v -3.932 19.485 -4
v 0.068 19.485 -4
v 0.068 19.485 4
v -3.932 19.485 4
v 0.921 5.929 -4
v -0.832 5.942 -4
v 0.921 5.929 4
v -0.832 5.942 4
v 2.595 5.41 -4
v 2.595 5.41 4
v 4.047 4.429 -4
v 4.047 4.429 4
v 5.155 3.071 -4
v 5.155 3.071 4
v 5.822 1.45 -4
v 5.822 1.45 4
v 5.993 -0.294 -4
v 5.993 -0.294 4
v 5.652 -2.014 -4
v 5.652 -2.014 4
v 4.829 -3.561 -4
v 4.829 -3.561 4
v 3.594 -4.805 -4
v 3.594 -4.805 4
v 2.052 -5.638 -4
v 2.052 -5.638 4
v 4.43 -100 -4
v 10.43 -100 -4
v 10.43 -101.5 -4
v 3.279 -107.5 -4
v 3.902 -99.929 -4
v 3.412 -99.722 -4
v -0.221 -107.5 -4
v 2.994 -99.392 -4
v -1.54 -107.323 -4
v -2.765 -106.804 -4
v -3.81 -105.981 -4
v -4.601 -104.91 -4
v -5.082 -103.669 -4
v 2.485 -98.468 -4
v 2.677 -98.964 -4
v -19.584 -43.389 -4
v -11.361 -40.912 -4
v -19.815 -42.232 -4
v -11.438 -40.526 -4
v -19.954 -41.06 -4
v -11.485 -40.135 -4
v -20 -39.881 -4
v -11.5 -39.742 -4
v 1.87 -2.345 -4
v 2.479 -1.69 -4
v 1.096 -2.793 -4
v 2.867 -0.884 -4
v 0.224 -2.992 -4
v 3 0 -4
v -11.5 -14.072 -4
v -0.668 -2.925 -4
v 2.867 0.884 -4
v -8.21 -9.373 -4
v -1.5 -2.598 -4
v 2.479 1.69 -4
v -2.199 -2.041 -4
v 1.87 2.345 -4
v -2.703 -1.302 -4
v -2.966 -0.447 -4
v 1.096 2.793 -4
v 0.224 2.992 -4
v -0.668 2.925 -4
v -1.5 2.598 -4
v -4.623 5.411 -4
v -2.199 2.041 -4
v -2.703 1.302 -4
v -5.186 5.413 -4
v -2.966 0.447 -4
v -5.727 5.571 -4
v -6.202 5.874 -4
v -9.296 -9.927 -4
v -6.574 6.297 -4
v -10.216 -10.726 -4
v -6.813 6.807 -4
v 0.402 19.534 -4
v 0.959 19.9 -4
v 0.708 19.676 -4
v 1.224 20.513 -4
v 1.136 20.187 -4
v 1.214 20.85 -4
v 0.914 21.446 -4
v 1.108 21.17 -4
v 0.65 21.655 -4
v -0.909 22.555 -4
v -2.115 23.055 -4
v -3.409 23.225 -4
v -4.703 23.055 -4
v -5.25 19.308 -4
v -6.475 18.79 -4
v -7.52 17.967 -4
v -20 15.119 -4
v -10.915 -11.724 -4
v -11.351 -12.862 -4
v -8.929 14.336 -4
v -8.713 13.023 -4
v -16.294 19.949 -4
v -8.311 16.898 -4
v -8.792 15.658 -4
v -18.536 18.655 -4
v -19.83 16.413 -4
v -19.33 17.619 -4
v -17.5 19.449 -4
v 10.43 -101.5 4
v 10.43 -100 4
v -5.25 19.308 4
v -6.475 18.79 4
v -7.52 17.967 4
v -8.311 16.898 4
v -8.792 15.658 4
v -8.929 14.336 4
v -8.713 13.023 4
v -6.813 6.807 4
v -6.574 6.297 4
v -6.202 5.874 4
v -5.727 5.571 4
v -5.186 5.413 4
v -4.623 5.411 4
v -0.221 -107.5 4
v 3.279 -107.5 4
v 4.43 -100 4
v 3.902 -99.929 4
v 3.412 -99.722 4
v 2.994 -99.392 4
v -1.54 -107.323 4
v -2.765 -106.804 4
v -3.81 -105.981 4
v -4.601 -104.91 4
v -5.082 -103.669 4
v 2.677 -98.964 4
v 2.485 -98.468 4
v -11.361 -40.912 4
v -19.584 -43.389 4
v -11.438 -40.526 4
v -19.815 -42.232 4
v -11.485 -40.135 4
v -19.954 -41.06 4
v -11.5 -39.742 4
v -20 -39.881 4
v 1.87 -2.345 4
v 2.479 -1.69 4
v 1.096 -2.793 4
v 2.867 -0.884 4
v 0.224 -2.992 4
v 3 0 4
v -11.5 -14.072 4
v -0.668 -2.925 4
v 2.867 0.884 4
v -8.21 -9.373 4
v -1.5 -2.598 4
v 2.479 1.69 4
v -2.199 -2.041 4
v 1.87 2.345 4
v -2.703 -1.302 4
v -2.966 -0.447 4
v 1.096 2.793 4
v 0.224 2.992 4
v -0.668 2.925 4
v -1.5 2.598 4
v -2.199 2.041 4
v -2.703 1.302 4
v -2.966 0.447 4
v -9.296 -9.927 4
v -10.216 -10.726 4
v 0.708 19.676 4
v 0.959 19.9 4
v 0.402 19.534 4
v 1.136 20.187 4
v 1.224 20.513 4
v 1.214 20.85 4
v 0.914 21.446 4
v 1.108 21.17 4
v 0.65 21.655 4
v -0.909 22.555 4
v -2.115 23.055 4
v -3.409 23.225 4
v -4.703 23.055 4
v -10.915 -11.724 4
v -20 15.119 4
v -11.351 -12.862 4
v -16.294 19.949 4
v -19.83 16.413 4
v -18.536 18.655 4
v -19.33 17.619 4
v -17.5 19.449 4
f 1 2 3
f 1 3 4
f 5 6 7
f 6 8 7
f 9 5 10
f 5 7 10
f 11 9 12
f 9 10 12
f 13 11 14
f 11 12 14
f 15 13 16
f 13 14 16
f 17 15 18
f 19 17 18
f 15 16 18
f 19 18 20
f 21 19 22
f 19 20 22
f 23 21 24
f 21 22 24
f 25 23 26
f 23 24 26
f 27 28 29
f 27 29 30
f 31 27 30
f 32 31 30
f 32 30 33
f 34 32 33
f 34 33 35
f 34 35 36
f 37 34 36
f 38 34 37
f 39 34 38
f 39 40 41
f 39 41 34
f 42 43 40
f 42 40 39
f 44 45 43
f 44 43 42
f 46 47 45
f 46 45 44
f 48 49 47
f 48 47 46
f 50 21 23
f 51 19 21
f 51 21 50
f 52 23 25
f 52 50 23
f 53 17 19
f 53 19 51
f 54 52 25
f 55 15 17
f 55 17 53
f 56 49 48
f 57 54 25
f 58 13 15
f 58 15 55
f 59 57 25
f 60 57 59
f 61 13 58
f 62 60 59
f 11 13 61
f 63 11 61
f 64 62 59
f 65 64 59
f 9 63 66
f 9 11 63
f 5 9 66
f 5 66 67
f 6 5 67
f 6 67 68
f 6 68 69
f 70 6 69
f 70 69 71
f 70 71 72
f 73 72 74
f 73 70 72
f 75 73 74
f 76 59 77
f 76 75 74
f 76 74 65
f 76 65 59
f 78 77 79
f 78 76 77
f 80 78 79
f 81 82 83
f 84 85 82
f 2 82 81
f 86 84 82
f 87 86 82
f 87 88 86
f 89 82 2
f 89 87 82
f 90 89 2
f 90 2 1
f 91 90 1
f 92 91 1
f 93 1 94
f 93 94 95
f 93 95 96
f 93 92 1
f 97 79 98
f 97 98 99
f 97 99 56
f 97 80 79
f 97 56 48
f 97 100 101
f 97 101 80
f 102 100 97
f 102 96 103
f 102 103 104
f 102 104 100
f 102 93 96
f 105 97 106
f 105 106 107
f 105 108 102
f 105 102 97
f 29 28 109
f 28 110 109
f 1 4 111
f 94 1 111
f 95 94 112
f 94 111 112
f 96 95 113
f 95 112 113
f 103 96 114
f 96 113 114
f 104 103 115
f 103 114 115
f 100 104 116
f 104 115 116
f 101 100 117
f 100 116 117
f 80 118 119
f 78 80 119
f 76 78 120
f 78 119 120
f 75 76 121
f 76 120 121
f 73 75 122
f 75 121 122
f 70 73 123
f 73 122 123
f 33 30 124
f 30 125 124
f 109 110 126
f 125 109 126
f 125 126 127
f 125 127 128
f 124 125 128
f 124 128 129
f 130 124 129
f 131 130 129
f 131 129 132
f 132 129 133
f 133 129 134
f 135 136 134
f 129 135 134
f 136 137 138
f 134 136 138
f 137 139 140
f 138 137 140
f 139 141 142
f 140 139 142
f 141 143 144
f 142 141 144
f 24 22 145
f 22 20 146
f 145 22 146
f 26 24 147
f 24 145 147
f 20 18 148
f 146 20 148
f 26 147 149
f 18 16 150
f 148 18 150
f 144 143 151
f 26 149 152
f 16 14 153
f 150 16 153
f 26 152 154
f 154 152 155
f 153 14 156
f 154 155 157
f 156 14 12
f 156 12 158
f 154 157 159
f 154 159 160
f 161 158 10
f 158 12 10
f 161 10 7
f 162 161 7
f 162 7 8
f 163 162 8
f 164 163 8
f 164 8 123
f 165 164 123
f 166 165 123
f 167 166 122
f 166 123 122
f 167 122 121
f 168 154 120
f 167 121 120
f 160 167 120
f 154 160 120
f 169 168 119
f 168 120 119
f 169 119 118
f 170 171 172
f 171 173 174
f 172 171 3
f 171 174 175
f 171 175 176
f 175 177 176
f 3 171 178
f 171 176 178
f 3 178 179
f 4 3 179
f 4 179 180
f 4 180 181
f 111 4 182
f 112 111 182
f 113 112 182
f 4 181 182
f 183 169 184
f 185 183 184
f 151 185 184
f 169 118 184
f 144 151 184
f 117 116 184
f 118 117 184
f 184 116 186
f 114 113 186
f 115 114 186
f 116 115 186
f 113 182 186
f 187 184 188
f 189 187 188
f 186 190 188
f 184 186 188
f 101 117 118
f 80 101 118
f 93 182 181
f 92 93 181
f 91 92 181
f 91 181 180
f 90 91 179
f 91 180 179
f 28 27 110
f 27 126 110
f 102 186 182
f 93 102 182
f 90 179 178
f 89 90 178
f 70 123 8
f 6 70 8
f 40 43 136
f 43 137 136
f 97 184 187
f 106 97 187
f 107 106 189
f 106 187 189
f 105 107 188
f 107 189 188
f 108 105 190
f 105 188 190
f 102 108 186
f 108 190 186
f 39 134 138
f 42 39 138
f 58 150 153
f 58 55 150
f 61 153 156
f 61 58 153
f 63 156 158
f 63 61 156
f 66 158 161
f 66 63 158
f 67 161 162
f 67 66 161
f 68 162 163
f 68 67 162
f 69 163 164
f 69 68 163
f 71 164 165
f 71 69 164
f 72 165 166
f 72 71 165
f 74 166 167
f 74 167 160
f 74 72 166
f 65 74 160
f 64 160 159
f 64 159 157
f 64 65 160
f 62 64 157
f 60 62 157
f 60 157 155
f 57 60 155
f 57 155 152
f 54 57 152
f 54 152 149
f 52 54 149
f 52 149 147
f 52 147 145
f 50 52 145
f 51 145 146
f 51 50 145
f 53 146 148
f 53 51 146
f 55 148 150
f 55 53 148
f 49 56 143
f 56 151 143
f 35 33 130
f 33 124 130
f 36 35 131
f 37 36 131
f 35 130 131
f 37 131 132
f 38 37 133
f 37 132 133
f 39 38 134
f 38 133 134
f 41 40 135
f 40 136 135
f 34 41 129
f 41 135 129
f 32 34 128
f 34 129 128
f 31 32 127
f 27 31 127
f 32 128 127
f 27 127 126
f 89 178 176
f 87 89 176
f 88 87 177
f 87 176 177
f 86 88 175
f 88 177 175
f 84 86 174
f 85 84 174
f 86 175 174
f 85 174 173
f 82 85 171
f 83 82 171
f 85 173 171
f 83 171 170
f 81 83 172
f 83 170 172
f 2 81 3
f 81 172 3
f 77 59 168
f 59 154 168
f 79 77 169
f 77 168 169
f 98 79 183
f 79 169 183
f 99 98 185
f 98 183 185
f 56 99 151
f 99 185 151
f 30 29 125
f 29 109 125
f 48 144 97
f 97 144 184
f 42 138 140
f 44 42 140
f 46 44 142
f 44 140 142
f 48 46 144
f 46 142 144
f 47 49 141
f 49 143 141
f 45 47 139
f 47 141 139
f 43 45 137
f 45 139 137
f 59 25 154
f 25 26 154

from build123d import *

# Parameters (mm, degrees)
ESQUISSE1_R        = 3
BOSS_EXTRU_1_DEPTH = 4


with BuildPart() as part:
    # Esquisse1 → Boss.-Extru.1 (new, symmetric)
    with BuildSketch(Plane.XY):
        with BuildLine():
            Line((-4.622690842, 5.411311669), (-0.831927473, 5.942044823))
            ThreePointArc((-0.831927473, 5.942044823), (5.822154168, 1.450007187), (2.05212086, -5.638155725))
            Line((2.05212086, -5.638155725), (-8.210100717, -9.373298916))
            ThreePointArc((-8.210100717, -9.373298916), (-10.595760221, -11.203879838), (-11.5, -14.07176202))
            Line((-11.5, -14.07176202), (-11.5, -39.742063683))
            ThreePointArc((-11.5, -39.742063683), (-11.465204853, -40.330910662), (-11.361303694, -40.911562034))
            Line((-11.361303694, -40.911562034), (2.485172244, -98.46779934))
            ThreePointArc((2.485172244, -98.46779934), (3.19187279, -99.570923085), (4.429693722, -100))
            Line((4.429693722, -100), (10.429693722, -100))
            Line((10.429693722, -100), (10.429693722, -101.5))
            Line((10.429693722, -101.5), (3.279172166, -107.5))
            Line((3.279172166, -107.5), (-0.220827834, -107.5))
            ThreePointArc((-0.220827834, -107.5), (-3.315380164, -106.427307714), (-5.082131528, -103.669498351))
            Line((-5.082131528, -103.669498351), (-19.583911082, -43.389332544))
            ThreePointArc((-19.583911082, -43.389332544), (-19.89561456, -41.647378427), (-20, -39.88083749))
            Line((-20, -39.88083749), (-20, 15.11916251))
            ThreePointArc((-20, 15.11916251), (-18.966766701, 18.162969655), (-16.294095226, 19.948791641))
            Line((-16.294095226, 19.948791641), (-4.70298531, 23.054620182))
            ThreePointArc((-4.70298531, 23.054620182), (-2.756259123, 23.182215358), (-0.908890085, 22.55511807))
            Line((-0.908890085, 22.55511807), (0.649955642, 21.65511807))
            ThreePointArc((0.649955642, 21.65511807), (1.191787733, 20.347019689), (0.068498187, 19.485089305))
            Line((0.068498187, 19.485089305), (-3.931501813, 19.485089305))
            ThreePointArc((-3.931501813, 19.485089305), (-7.950786116, 17.459203239), (-8.713025593, 13.023230781))
            Line((-8.713025593, 13.023230781), (-6.812609512, 6.807249868))
            ThreePointArc((-6.812609512, 6.807249868), (-5.975040779, 5.705491773), (-4.622690842, 5.411311669))
        make_face()
        Circle(ESQUISSE1_R, mode=Mode.SUBTRACT)
    extrude(amount=BOSS_EXTRU_1_DEPTH, both=True)


solid = part.part
